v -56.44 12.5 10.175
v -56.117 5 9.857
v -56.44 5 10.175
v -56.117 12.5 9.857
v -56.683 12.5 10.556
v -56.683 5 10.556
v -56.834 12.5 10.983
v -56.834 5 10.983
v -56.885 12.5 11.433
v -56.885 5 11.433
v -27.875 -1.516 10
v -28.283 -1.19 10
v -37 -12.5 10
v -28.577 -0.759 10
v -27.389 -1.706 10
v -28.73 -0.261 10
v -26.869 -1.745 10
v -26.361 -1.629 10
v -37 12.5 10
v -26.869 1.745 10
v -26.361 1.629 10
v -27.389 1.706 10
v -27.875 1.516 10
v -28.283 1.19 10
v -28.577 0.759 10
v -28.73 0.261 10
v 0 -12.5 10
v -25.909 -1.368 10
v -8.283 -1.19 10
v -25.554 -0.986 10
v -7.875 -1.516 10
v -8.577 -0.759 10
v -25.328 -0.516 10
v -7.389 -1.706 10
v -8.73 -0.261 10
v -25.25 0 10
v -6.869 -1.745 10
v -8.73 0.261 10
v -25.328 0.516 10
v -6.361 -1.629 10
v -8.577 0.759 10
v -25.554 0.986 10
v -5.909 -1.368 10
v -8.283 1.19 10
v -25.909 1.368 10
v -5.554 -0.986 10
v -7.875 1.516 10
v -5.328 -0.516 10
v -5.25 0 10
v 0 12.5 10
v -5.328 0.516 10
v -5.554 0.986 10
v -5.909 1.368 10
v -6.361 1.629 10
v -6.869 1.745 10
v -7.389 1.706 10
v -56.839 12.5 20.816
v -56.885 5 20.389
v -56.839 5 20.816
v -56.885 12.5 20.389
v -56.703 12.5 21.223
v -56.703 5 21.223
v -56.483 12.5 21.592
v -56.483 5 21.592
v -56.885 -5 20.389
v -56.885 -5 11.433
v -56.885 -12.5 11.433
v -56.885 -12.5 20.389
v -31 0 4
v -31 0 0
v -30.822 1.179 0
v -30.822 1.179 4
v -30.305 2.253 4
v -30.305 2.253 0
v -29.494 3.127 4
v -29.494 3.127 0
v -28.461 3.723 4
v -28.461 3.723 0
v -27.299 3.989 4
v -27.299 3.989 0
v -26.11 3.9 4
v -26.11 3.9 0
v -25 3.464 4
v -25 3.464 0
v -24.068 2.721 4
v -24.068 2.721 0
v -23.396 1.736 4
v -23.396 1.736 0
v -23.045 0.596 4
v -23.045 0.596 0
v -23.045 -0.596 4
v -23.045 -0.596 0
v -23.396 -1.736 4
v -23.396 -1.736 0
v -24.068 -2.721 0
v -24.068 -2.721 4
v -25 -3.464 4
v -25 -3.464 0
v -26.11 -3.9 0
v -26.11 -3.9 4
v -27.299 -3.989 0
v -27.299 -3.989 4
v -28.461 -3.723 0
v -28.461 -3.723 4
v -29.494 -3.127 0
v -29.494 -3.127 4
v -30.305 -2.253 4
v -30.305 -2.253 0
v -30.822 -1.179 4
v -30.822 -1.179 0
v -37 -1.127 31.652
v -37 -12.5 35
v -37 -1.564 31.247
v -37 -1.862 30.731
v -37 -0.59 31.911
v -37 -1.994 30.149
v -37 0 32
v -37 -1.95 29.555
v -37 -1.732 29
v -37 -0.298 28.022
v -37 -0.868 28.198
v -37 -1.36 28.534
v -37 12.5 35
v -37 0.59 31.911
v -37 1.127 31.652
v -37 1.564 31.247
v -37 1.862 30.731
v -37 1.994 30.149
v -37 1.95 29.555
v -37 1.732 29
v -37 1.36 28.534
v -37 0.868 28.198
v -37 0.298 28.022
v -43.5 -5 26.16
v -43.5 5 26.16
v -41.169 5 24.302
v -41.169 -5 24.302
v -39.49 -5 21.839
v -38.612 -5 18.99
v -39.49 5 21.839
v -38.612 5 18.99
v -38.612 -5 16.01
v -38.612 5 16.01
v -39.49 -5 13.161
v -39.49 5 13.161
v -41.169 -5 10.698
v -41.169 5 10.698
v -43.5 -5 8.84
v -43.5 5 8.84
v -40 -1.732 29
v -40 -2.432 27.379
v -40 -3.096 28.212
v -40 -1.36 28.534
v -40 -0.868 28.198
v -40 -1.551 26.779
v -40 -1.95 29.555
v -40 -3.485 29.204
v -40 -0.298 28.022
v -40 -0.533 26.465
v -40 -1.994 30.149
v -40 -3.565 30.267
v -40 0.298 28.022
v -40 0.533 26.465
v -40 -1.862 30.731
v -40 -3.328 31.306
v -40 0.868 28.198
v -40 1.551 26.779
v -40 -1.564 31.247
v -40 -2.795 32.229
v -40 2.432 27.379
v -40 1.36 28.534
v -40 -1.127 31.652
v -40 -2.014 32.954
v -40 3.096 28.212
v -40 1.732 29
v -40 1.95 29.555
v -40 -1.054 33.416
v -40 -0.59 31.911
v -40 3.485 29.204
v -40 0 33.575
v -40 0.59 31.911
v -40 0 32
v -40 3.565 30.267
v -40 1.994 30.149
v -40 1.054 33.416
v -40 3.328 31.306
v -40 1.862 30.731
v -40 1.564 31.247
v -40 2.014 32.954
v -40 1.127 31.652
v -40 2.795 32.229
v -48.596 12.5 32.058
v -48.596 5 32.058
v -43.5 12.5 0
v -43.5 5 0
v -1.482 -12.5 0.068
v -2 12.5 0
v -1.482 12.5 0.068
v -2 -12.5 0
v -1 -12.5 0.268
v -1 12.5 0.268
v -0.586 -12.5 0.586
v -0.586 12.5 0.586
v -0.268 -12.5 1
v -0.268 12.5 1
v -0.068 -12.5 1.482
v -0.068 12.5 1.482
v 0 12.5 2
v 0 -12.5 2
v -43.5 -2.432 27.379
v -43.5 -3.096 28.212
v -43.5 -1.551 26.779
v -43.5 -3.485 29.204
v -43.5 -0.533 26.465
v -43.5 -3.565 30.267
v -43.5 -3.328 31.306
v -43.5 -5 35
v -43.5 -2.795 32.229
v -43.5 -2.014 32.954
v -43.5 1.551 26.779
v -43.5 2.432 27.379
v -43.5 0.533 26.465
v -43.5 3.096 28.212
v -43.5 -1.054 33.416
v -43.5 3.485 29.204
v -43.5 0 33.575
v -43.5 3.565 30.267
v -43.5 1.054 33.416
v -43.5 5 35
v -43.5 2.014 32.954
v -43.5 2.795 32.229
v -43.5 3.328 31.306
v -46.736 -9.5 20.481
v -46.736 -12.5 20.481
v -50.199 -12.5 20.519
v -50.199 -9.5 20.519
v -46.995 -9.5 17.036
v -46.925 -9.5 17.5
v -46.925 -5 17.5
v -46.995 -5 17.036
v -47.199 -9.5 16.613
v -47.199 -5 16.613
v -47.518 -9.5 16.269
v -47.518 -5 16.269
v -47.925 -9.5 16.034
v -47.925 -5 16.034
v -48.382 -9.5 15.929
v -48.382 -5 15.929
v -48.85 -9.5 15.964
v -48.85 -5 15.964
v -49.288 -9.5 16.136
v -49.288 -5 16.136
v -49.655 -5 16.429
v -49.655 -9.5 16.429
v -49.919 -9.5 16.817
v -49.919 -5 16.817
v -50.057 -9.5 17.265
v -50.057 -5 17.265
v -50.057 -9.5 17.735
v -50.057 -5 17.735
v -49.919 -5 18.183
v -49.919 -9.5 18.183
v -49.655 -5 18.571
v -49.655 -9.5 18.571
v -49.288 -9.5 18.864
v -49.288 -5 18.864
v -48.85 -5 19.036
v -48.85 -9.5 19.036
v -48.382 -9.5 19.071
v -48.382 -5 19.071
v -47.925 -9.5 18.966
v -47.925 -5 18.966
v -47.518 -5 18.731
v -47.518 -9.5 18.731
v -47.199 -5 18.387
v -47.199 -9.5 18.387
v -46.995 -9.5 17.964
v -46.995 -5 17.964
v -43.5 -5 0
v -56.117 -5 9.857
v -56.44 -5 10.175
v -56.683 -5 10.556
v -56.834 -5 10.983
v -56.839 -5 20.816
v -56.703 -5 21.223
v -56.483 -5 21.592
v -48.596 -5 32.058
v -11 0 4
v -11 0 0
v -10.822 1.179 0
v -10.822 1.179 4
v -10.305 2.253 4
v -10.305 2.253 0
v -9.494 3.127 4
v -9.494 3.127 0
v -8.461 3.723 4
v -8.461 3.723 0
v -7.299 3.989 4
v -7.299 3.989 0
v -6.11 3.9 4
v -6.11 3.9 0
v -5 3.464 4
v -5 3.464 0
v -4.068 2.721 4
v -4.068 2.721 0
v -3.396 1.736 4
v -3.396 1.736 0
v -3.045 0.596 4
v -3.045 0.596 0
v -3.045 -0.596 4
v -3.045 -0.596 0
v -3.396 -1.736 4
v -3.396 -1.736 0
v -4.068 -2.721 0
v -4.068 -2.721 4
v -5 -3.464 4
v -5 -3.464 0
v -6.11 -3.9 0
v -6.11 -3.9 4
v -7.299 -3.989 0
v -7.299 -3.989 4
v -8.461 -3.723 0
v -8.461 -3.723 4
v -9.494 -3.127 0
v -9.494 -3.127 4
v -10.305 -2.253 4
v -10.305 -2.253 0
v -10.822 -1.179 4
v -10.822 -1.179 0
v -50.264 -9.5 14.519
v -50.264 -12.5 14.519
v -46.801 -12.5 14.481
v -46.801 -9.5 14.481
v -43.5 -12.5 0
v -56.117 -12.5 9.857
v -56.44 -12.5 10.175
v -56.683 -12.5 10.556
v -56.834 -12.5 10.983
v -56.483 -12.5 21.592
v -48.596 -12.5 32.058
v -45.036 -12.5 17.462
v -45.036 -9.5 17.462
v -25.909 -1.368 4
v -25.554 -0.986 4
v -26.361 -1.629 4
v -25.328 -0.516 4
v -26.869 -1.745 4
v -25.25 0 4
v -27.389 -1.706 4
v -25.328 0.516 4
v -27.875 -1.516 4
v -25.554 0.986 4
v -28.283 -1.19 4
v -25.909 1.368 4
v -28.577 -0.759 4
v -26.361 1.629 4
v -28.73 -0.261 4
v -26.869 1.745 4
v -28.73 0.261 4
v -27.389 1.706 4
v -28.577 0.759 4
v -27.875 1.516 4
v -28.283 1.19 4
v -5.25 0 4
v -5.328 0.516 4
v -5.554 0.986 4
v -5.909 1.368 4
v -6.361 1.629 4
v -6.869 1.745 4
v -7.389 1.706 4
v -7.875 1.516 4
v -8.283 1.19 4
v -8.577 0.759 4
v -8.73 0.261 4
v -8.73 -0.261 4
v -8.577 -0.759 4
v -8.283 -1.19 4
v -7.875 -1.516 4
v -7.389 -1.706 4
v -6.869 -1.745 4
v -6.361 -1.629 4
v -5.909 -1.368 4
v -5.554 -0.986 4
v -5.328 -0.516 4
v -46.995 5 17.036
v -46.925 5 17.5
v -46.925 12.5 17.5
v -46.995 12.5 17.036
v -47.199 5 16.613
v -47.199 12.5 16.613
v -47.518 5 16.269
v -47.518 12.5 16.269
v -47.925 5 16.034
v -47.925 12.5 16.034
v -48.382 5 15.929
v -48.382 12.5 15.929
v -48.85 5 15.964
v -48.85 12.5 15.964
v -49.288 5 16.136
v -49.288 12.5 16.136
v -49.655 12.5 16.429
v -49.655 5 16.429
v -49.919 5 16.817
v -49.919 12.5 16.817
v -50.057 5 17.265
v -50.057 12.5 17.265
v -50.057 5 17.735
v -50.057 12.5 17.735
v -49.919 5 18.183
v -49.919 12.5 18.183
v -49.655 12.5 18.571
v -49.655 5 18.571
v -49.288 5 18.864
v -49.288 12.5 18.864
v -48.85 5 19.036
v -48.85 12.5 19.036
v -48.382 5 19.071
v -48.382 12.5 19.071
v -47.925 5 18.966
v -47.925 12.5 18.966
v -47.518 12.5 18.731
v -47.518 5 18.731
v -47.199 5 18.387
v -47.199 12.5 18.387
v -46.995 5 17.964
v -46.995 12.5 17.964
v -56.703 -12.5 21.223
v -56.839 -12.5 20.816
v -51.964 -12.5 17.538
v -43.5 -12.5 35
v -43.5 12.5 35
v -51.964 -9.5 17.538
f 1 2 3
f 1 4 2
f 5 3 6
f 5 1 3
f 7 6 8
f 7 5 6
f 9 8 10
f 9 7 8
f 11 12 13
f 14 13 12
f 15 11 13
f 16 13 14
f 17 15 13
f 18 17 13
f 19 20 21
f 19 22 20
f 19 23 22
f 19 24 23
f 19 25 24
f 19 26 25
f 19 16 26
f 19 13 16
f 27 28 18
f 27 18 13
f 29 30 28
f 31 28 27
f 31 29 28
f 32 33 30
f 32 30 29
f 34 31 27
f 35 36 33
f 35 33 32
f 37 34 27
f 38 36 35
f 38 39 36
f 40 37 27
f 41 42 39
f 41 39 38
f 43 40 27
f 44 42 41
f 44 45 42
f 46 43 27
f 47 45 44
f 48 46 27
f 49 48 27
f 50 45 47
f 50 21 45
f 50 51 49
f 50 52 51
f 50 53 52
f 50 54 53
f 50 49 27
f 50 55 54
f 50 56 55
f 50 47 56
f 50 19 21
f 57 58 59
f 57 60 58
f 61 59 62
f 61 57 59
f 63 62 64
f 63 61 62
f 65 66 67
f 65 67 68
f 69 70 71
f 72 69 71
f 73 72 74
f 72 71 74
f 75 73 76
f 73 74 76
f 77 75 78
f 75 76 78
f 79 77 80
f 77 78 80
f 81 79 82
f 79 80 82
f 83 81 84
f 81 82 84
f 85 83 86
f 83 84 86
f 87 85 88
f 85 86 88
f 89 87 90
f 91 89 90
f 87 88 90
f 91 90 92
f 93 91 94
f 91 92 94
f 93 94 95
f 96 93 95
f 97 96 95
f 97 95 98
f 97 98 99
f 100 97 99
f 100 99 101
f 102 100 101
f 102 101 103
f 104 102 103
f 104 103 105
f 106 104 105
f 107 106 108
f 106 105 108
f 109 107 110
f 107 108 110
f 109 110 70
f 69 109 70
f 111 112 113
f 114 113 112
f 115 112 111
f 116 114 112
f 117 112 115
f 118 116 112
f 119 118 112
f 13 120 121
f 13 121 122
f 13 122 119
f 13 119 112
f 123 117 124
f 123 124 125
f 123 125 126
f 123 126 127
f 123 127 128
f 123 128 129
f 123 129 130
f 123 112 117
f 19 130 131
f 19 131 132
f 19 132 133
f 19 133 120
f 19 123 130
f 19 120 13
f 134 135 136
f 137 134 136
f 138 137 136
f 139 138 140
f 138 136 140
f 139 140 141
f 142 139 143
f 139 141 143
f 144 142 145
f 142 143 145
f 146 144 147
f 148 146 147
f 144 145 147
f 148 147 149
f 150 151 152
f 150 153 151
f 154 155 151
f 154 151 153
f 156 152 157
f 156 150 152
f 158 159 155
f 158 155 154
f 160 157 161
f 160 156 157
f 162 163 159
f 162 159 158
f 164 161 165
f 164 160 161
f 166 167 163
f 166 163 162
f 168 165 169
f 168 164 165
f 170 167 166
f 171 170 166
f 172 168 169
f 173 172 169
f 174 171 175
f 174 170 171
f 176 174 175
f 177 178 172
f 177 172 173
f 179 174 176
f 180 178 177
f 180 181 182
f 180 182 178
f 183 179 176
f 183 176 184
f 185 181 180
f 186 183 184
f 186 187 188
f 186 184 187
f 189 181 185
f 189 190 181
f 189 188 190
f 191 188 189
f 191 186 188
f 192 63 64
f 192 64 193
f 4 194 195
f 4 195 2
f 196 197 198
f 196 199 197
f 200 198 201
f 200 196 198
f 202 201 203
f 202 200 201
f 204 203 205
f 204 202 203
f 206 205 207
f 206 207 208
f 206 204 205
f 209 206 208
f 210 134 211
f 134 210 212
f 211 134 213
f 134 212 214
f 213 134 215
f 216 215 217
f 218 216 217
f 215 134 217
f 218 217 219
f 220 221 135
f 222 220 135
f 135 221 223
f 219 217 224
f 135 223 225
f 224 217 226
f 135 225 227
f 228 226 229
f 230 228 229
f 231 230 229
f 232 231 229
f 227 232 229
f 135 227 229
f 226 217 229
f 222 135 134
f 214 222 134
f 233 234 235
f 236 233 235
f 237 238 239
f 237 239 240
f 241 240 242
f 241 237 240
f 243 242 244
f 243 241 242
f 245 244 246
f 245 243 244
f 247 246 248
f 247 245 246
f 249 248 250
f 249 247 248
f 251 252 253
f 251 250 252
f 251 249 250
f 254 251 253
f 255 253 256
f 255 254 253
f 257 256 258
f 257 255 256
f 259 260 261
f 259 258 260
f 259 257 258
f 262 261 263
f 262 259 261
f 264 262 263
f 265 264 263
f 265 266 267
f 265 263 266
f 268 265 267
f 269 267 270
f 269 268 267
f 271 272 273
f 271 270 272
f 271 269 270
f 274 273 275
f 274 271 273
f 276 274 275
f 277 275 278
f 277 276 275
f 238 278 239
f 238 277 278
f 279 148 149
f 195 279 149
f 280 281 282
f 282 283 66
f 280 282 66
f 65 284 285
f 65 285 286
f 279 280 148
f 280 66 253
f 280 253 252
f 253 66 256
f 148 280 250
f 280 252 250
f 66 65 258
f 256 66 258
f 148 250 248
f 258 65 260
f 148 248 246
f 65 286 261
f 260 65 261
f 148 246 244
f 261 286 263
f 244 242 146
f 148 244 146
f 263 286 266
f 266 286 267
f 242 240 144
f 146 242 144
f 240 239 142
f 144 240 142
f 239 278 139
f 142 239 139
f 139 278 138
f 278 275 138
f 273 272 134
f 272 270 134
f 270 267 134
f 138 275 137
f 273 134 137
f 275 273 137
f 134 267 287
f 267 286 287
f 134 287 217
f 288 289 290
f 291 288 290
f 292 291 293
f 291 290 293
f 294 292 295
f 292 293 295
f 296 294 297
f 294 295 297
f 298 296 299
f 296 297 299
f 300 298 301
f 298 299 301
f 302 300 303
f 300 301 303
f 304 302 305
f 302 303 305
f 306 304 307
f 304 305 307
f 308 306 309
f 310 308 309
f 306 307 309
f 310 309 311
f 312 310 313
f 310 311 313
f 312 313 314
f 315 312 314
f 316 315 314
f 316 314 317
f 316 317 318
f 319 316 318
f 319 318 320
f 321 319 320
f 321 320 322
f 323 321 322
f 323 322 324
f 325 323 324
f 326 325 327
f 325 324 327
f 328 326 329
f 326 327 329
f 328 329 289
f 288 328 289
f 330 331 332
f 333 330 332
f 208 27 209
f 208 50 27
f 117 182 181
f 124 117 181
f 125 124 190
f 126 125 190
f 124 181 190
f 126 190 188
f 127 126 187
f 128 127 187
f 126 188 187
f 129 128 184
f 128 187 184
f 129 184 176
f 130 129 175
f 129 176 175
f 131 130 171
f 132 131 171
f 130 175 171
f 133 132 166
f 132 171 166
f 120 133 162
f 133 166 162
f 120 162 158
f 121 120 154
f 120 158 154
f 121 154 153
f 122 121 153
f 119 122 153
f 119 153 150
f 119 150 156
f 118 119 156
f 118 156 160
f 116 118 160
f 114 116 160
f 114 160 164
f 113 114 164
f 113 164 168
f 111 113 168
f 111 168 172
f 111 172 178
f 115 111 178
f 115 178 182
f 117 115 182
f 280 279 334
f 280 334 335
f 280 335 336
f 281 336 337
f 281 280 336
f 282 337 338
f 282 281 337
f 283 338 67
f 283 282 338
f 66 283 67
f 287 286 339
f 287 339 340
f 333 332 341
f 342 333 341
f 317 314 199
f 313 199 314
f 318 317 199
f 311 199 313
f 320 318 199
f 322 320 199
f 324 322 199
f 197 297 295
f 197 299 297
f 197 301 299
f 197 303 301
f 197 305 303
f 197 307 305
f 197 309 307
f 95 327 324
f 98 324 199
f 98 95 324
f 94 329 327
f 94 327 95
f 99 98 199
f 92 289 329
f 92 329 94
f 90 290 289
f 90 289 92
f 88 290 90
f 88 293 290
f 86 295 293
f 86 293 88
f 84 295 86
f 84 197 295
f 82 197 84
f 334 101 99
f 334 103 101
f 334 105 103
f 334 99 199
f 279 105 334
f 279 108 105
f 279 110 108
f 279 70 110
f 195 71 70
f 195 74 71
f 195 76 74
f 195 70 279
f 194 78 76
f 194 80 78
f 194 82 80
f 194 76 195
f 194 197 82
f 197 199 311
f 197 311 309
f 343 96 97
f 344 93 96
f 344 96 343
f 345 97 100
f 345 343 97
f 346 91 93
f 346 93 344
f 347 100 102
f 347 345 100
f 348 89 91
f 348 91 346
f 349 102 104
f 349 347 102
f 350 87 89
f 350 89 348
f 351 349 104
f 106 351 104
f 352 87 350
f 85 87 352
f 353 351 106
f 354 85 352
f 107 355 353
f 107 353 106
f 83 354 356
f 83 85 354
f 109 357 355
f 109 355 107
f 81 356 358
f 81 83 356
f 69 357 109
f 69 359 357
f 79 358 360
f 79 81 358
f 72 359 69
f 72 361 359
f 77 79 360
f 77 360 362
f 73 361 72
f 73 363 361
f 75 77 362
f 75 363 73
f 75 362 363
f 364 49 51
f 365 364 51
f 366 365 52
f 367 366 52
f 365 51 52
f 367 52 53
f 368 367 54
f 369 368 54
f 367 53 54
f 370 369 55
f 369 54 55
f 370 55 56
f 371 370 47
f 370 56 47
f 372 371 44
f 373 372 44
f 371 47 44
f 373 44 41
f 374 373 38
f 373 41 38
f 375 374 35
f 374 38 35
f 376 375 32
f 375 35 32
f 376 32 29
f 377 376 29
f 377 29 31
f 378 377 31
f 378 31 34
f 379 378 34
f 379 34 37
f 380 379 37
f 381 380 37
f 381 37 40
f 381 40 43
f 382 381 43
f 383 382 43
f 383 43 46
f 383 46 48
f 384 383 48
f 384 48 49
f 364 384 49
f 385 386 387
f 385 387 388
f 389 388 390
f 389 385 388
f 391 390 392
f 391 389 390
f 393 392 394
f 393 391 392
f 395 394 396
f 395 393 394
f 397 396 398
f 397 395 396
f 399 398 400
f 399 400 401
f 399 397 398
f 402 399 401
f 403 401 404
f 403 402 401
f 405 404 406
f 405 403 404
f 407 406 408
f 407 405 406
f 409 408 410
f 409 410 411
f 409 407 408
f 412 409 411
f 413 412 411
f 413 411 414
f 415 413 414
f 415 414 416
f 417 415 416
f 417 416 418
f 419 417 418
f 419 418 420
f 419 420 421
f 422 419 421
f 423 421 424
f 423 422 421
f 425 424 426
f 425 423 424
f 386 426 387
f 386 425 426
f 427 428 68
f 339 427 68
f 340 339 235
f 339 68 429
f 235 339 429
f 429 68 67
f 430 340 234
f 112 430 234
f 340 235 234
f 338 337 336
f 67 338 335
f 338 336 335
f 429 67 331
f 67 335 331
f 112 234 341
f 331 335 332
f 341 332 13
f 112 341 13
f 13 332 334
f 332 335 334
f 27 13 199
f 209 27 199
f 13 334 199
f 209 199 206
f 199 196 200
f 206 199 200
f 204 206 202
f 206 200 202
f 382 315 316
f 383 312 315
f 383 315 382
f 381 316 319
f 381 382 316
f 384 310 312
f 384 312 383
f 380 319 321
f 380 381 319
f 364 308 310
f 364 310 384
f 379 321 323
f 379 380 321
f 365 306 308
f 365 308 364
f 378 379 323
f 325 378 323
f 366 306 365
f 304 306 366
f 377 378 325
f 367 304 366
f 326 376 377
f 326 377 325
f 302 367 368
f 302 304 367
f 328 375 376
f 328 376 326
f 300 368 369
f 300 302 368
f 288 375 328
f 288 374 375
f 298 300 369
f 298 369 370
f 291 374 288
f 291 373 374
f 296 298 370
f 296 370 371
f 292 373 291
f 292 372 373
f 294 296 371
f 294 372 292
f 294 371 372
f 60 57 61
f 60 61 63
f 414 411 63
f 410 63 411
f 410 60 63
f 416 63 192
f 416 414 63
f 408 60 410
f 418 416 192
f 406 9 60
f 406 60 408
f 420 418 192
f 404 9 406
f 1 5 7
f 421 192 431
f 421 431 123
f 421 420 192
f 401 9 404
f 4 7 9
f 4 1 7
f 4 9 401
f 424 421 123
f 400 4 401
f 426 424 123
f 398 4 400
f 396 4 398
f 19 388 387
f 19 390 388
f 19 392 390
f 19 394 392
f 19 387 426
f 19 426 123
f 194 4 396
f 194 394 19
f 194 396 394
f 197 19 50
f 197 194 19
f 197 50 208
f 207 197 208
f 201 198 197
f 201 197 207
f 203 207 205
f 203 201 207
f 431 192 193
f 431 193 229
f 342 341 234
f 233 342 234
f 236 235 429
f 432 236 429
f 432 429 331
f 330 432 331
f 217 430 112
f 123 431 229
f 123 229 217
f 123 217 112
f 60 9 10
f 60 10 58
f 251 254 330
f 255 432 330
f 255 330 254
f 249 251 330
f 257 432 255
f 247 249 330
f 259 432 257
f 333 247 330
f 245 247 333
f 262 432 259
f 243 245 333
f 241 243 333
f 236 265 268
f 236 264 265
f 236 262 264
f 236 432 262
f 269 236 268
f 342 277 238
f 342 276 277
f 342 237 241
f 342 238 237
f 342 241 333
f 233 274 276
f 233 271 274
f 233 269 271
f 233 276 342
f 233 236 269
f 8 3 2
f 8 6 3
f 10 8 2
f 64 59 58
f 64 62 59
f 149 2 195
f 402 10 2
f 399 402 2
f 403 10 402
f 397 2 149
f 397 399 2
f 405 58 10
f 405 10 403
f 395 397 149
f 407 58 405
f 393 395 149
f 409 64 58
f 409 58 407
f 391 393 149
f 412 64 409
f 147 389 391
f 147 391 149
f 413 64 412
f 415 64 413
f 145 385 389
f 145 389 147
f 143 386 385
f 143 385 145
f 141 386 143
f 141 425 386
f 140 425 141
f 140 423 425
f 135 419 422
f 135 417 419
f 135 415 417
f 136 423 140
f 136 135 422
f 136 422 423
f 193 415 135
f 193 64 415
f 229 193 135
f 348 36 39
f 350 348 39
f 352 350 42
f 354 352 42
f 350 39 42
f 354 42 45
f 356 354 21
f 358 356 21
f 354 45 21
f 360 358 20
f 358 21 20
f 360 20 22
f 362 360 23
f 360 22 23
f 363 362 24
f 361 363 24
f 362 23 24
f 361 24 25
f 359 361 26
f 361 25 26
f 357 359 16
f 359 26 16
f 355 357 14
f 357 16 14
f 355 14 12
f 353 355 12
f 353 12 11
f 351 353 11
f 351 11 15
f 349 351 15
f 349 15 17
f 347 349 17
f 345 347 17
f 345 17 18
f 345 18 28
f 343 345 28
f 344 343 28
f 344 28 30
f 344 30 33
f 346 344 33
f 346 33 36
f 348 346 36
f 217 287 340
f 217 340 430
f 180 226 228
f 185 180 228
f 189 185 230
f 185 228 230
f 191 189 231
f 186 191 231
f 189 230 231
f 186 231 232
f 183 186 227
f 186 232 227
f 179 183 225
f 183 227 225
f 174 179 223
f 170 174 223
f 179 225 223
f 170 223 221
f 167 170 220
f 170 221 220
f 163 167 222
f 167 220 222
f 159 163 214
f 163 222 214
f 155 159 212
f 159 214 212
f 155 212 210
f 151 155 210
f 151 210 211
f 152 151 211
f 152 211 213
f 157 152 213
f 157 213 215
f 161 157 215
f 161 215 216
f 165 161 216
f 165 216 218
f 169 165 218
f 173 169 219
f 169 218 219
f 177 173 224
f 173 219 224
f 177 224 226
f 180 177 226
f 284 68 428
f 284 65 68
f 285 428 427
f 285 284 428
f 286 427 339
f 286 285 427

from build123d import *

# Parameters (mm, degrees)
SKETCH1_R               = 1.575
BOSS_EXTRUDE1_DEPTH     = 12.5
SKETCH2_W               = 13.385271969
SKETCH2_H               = 10
CUT_EXTRUDE1_DEPTH      = 36
SKETCH3_R               = 1.75
CUT_EXTRUDE2_DEPTH      = 25
SKETCH4_R               = 4
CUT_EXTRUDE3_DEPTH      = 4
FILLET1_R               = 2
SKETCH5_R               = 2
CUT_EXTRUDE4_DEPTH      = 10
SKETCH7_R               = 3.575
CUT_EXTRUDE5_DEPTH      = 3.5
SKETCH8_R               = 10
CUT_EXTRUDE6_DEPTH      = 5
CUT_EXTRUDE6_DEPTH_BACK = 5
CUT_EXTRUDE7_DEPTH      = 3


with BuildPart() as part:
    # Sketch1 → Boss-Extrude1 (new body, symmetric)
    with BuildSketch(Plane(origin=(0, 0, 0), x_dir=(1, 0, 0), z_dir=(0, 1, 0))):
        Polygon((0, 0), (-43.5, 0), (-56.885271969, -10.457720596), (-56.885271969, -21.057720596), (-48.596177418, -32.057720596), (-43.5, -35), (-37, -35), (-37, -10), (0, -10), align=None)
        with Locations((-48.5, -17.5)):
            Circle(SKETCH1_R, mode=Mode.SUBTRACT)
    extrude(amount=BOSS_EXTRUDE1_DEPTH, both=True)

    # Sketch2 → Cut-Extrude1 (cut, through all)
    with BuildSketch(Plane.XY.offset(35)):
        with Locations((-50.192635985, 0)):
            Rectangle(SKETCH2_W, SKETCH2_H)
    extrude(amount=-CUT_EXTRUDE1_DEPTH, mode=Mode.SUBTRACT)

    # Sketch3 → Cut-Extrude2 (cut)
    with BuildSketch(Plane.XY.offset(10)):
        with Locations((-27, 0)):
            Circle(SKETCH3_R)
        with Locations((-7, 0)):
            Circle(SKETCH3_R)
    extrude(amount=-CUT_EXTRUDE2_DEPTH, mode=Mode.SUBTRACT)

    # Sketch4 → Cut-Extrude3 (cut)
    with BuildSketch(Plane(origin=(0, 0, 0), x_dir=(-1, 0, 0), z_dir=(0, 0, -1))):
        with Locations((7, 0)):
            Circle(SKETCH4_R)
        with Locations((27, 0)):
            Circle(SKETCH4_R)
    extrude(amount=-CUT_EXTRUDE3_DEPTH, mode=Mode.SUBTRACT)

    # Fillet1
    fillet1_edges = [part.edges().sort_by_distance(p)[0] for p in [
        (-56.885271969, 8.75, 21.057720596),
        (-56.885271969, 8.75, 10.457720596),
        (0, 0, 0),
        (-56.885271969, -8.75, 21.057720596),
        (-56.885271969, -8.75, 10.457720596),
    ]]
    fillet(fillet1_edges, radius=FILLET1_R)

    # Sketch5 → Cut-Extrude4 (cut)
    with BuildSketch(Plane.ZY.offset(43.5)):
        with Locations((30, 0)):
            Circle(SKETCH5_R)
    extrude(amount=-CUT_EXTRUDE4_DEPTH, mode=Mode.SUBTRACT)

    # Sketch7 → Cut-Extrude5 (cut)
    with BuildSketch(Plane.ZY.offset(43.5)):
        with Locations((30, 0)):
            Circle(SKETCH7_R)
    extrude(amount=-CUT_EXTRUDE5_DEPTH, mode=Mode.SUBTRACT)

    # Sketch8 → Cut-Extrude6 (cut, two sides)
    with BuildSketch(Plane(origin=(0, 0, 0), x_dir=(1, 0, 0), z_dir=(0, 1, 0))) as cut_extrude6_sk:
        with Locations((-48.5, -17.5)):
            Circle(SKETCH8_R)
    extrude(amount=CUT_EXTRUDE6_DEPTH, mode=Mode.SUBTRACT)
    extrude(cut_extrude6_sk.sketch, amount=-CUT_EXTRUDE6_DEPTH_BACK, mode=Mode.SUBTRACT)

    # Sketch9 → Cut-Extrude7 (cut)
    with BuildSketch(Plane.XZ.offset(12.5)):
        Polygon((-46.800589834, 14.481390206), (-45.036102151, 17.462427479), (-46.735512318, 20.481037272), (-50.199410166, 20.518609794), (-51.963897849, 17.537572521), (-50.264487682, 14.518962728), align=None)
    extrude(amount=-CUT_EXTRUDE7_DEPTH, mode=Mode.SUBTRACT)


solid = part.part
